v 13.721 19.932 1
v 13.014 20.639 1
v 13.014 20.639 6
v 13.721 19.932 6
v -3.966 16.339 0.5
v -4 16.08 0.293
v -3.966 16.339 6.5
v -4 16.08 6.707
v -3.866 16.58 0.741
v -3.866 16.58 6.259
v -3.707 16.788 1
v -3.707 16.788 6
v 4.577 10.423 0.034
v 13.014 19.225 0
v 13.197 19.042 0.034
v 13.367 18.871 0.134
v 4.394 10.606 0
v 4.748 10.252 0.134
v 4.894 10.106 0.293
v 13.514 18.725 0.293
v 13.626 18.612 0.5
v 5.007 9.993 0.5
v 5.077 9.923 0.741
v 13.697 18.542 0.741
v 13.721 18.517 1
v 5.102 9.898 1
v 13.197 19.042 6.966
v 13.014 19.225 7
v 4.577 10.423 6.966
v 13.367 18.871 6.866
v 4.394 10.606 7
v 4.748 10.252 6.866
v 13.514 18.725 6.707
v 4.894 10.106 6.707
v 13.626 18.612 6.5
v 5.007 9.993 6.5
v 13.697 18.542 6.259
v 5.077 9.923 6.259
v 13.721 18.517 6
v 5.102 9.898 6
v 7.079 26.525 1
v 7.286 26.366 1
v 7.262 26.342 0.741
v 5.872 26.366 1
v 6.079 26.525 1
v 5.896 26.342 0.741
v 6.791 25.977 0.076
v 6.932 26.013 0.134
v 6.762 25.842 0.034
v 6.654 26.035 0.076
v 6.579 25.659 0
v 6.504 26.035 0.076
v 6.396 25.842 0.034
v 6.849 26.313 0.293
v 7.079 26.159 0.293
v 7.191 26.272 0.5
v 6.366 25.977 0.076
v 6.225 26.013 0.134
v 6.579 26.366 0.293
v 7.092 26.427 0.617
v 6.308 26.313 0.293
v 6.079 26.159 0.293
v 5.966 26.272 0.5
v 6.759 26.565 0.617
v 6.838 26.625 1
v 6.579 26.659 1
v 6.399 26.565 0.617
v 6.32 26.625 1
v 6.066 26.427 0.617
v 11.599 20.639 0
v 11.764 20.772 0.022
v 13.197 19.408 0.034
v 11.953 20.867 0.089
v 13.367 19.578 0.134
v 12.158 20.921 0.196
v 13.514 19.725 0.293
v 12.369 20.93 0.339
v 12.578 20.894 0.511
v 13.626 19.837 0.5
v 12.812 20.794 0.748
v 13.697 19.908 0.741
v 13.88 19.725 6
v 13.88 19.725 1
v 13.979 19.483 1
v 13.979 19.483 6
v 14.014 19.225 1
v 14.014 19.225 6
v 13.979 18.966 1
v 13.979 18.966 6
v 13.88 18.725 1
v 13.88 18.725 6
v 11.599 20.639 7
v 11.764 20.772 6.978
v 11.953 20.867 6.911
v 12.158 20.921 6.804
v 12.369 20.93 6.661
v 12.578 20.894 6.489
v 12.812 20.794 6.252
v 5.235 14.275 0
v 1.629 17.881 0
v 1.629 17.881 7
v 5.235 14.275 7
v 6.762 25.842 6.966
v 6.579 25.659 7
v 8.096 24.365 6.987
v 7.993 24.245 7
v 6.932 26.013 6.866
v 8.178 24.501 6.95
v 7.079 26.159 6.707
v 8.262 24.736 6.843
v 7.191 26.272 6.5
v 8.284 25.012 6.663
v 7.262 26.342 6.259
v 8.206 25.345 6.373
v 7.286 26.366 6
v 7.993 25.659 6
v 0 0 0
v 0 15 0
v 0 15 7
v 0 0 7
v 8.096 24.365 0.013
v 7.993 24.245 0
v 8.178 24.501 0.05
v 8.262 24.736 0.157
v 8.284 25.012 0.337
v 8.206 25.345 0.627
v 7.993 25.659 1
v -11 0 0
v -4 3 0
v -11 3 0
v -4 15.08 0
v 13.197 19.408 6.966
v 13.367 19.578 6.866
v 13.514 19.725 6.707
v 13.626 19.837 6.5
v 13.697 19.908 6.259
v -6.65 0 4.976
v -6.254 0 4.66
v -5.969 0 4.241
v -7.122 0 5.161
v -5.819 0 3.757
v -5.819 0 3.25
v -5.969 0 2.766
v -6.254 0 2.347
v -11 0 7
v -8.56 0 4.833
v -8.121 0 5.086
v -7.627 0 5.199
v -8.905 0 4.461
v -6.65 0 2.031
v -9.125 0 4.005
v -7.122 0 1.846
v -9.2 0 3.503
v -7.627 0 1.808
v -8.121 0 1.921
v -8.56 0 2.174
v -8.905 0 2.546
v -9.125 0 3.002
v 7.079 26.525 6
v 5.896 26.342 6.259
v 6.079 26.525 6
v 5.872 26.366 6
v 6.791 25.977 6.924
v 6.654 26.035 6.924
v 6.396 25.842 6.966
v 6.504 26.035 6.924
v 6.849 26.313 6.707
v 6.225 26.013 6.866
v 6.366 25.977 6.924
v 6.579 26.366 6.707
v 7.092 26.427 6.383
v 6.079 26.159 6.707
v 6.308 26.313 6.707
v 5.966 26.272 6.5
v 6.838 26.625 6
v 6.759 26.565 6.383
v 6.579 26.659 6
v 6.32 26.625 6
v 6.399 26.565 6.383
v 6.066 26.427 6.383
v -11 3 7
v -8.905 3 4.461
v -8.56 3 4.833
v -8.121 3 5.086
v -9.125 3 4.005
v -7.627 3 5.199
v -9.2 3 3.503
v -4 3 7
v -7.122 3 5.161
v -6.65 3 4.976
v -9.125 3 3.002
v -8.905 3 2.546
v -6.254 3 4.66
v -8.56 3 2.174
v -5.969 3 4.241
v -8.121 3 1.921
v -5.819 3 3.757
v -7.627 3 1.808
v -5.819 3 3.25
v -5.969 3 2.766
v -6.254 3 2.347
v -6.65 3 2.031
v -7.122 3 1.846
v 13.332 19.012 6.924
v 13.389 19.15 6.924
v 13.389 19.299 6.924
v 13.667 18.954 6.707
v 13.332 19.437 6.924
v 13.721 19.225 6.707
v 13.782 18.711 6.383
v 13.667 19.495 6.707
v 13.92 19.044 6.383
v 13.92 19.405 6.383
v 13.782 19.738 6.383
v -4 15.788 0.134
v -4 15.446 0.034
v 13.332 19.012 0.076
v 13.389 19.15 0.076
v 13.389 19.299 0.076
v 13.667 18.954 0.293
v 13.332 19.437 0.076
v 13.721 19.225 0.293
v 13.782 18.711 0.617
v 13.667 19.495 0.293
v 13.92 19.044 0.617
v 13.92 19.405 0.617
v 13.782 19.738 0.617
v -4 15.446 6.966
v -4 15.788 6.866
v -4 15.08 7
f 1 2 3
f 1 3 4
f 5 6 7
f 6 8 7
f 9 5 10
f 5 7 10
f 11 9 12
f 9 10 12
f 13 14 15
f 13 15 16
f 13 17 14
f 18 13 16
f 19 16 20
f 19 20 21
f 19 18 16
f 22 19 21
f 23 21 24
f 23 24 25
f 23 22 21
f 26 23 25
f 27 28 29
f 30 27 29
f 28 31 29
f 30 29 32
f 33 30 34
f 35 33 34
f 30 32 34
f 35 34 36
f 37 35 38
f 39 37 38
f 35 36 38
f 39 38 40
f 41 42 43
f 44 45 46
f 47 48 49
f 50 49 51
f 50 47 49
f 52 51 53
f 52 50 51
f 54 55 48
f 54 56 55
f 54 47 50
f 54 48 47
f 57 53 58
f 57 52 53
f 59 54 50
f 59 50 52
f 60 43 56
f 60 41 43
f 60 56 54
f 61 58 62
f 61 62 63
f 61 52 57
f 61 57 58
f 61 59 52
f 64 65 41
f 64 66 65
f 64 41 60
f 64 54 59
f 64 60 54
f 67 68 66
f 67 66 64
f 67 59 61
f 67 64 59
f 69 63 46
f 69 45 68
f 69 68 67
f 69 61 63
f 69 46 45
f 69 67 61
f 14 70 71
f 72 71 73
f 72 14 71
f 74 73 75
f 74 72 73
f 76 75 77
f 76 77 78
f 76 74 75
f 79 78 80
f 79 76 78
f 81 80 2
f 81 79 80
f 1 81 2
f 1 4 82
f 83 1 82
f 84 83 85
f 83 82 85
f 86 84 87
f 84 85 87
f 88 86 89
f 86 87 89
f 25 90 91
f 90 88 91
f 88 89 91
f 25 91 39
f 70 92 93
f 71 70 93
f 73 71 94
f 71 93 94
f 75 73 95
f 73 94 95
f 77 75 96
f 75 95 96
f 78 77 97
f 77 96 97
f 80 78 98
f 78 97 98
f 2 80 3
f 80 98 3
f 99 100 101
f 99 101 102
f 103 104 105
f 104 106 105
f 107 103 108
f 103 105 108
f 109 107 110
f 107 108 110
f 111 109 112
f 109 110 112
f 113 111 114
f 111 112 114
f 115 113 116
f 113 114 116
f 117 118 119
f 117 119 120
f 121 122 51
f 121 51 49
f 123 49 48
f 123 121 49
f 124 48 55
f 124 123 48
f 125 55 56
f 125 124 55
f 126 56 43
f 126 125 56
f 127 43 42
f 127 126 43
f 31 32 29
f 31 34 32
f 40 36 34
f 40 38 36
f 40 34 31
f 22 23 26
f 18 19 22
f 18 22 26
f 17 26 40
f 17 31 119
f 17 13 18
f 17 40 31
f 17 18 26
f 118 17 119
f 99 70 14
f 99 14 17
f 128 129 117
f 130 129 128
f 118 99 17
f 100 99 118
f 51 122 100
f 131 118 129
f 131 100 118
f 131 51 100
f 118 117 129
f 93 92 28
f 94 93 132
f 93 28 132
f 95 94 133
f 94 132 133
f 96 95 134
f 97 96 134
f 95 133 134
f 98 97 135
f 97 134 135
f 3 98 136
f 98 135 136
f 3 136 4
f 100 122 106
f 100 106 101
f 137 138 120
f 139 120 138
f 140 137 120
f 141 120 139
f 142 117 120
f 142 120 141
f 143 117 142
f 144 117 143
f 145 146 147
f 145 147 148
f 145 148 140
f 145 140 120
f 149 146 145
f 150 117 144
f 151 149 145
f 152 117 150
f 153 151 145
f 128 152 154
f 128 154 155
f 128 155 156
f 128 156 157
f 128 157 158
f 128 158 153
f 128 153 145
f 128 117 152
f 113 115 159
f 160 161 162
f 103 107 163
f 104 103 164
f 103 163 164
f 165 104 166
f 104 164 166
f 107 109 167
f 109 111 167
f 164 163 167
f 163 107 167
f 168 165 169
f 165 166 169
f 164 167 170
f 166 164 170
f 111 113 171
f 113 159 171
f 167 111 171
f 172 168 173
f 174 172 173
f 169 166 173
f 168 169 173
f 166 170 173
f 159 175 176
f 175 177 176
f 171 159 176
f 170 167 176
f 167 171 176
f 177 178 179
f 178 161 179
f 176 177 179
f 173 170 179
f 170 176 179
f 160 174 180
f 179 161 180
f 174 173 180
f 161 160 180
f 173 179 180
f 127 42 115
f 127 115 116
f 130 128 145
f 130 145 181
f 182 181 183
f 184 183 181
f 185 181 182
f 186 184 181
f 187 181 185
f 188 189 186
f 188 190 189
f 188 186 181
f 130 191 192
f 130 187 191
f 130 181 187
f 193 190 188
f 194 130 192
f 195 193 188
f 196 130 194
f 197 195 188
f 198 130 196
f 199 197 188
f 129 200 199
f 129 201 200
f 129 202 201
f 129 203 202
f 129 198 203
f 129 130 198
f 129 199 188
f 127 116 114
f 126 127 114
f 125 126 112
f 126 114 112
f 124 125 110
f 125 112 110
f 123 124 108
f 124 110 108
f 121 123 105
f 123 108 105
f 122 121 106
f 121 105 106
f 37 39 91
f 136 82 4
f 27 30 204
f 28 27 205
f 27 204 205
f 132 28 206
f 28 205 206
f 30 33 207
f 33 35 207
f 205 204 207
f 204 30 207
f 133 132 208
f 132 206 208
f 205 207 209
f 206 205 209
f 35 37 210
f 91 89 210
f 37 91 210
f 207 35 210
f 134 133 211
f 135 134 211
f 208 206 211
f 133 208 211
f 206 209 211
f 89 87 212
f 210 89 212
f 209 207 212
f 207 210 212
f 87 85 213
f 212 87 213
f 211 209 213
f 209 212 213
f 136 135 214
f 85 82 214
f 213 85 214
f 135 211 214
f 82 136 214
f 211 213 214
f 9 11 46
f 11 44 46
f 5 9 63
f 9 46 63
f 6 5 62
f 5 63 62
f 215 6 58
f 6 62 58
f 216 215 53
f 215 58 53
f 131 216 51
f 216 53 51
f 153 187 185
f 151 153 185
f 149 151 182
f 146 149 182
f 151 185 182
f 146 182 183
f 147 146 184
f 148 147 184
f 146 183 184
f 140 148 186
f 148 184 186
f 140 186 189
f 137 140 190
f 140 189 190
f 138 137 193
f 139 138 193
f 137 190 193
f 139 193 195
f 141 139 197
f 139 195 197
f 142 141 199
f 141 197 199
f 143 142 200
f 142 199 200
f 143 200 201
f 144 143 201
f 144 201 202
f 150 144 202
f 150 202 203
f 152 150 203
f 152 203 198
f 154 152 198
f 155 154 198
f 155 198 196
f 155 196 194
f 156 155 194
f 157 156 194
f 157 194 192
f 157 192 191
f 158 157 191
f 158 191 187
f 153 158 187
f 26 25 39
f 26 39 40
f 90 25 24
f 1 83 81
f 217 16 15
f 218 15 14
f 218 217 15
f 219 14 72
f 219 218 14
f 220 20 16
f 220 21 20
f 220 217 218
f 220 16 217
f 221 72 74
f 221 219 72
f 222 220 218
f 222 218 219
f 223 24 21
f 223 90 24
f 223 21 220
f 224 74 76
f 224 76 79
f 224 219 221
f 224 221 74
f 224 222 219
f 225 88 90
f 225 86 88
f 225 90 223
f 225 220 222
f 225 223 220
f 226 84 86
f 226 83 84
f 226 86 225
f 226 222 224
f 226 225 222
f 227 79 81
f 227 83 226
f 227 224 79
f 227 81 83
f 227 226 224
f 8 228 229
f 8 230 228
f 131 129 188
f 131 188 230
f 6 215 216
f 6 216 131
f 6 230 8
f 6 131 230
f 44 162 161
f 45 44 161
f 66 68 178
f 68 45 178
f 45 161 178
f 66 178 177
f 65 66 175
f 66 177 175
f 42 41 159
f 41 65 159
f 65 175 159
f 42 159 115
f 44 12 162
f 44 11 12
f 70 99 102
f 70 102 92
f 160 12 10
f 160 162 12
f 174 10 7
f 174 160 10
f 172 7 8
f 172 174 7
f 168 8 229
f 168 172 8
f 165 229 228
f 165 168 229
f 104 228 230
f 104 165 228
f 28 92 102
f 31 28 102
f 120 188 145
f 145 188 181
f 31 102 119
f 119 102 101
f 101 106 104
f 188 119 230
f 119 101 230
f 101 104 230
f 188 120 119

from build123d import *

# Parameters (mm, degrees)
PAD_DEPTH    = 7
SKETCH001_R  = 1.7
POCKET_DEPTH = 5
FILLET_R     = 1


with BuildPart() as part:
    # Sketch → Pad (new body)
    with BuildSketch(Plane.XY):
        Polygon((-4, 3), (-4, 16.494625), (6.578848, 27.073473), (8.700169, 24.952153), (1.629101, 17.881085), (5.235345, 14.274841), (12.306413, 21.345908), (14.427734, 19.224588), (5.101573, 9.898427), (0, 15), (0, 0), (-11, 0), (-11, 3), align=None)
    extrude(amount=PAD_DEPTH)

    # Sketch001 → Pocket (cut)
    with BuildSketch(Plane(origin=(0, 3, 0), x_dir=(-1, 0, 0), z_dir=(0, 1, 0))):
        with Locations((7.500211, 3.503477)):
            Circle(SKETCH001_R)
    extrude(amount=-POCKET_DEPTH, mode=Mode.SUBTRACT)

    # Fillet
    fillet_edges = [part.edges().sort_by_distance(p)[0] for p in [
        (8.700169, 24.952153, 3.5),
        (12.306413, 21.345908, 3.5),
        (7.639509, 26.012813, 7),
        (1.289424, 21.784049, 7),
        (6.578848, 27.073473, 3.5),
        (7.639509, 26.012813, 0),
        (1.289424, 21.784049, 0),
        (13.367073, 20.285248, 7),
        (13.367073, 20.285248, 0),
        (14.427734, 19.224588, 3.5),
        (9.764653, 14.561508, 7),
        (9.764653, 14.561508, 0),
        (-4, 16.494625, 3.5),
    ]]
    fillet(fillet_edges, radius=FILLET_R)


solid = part.part
